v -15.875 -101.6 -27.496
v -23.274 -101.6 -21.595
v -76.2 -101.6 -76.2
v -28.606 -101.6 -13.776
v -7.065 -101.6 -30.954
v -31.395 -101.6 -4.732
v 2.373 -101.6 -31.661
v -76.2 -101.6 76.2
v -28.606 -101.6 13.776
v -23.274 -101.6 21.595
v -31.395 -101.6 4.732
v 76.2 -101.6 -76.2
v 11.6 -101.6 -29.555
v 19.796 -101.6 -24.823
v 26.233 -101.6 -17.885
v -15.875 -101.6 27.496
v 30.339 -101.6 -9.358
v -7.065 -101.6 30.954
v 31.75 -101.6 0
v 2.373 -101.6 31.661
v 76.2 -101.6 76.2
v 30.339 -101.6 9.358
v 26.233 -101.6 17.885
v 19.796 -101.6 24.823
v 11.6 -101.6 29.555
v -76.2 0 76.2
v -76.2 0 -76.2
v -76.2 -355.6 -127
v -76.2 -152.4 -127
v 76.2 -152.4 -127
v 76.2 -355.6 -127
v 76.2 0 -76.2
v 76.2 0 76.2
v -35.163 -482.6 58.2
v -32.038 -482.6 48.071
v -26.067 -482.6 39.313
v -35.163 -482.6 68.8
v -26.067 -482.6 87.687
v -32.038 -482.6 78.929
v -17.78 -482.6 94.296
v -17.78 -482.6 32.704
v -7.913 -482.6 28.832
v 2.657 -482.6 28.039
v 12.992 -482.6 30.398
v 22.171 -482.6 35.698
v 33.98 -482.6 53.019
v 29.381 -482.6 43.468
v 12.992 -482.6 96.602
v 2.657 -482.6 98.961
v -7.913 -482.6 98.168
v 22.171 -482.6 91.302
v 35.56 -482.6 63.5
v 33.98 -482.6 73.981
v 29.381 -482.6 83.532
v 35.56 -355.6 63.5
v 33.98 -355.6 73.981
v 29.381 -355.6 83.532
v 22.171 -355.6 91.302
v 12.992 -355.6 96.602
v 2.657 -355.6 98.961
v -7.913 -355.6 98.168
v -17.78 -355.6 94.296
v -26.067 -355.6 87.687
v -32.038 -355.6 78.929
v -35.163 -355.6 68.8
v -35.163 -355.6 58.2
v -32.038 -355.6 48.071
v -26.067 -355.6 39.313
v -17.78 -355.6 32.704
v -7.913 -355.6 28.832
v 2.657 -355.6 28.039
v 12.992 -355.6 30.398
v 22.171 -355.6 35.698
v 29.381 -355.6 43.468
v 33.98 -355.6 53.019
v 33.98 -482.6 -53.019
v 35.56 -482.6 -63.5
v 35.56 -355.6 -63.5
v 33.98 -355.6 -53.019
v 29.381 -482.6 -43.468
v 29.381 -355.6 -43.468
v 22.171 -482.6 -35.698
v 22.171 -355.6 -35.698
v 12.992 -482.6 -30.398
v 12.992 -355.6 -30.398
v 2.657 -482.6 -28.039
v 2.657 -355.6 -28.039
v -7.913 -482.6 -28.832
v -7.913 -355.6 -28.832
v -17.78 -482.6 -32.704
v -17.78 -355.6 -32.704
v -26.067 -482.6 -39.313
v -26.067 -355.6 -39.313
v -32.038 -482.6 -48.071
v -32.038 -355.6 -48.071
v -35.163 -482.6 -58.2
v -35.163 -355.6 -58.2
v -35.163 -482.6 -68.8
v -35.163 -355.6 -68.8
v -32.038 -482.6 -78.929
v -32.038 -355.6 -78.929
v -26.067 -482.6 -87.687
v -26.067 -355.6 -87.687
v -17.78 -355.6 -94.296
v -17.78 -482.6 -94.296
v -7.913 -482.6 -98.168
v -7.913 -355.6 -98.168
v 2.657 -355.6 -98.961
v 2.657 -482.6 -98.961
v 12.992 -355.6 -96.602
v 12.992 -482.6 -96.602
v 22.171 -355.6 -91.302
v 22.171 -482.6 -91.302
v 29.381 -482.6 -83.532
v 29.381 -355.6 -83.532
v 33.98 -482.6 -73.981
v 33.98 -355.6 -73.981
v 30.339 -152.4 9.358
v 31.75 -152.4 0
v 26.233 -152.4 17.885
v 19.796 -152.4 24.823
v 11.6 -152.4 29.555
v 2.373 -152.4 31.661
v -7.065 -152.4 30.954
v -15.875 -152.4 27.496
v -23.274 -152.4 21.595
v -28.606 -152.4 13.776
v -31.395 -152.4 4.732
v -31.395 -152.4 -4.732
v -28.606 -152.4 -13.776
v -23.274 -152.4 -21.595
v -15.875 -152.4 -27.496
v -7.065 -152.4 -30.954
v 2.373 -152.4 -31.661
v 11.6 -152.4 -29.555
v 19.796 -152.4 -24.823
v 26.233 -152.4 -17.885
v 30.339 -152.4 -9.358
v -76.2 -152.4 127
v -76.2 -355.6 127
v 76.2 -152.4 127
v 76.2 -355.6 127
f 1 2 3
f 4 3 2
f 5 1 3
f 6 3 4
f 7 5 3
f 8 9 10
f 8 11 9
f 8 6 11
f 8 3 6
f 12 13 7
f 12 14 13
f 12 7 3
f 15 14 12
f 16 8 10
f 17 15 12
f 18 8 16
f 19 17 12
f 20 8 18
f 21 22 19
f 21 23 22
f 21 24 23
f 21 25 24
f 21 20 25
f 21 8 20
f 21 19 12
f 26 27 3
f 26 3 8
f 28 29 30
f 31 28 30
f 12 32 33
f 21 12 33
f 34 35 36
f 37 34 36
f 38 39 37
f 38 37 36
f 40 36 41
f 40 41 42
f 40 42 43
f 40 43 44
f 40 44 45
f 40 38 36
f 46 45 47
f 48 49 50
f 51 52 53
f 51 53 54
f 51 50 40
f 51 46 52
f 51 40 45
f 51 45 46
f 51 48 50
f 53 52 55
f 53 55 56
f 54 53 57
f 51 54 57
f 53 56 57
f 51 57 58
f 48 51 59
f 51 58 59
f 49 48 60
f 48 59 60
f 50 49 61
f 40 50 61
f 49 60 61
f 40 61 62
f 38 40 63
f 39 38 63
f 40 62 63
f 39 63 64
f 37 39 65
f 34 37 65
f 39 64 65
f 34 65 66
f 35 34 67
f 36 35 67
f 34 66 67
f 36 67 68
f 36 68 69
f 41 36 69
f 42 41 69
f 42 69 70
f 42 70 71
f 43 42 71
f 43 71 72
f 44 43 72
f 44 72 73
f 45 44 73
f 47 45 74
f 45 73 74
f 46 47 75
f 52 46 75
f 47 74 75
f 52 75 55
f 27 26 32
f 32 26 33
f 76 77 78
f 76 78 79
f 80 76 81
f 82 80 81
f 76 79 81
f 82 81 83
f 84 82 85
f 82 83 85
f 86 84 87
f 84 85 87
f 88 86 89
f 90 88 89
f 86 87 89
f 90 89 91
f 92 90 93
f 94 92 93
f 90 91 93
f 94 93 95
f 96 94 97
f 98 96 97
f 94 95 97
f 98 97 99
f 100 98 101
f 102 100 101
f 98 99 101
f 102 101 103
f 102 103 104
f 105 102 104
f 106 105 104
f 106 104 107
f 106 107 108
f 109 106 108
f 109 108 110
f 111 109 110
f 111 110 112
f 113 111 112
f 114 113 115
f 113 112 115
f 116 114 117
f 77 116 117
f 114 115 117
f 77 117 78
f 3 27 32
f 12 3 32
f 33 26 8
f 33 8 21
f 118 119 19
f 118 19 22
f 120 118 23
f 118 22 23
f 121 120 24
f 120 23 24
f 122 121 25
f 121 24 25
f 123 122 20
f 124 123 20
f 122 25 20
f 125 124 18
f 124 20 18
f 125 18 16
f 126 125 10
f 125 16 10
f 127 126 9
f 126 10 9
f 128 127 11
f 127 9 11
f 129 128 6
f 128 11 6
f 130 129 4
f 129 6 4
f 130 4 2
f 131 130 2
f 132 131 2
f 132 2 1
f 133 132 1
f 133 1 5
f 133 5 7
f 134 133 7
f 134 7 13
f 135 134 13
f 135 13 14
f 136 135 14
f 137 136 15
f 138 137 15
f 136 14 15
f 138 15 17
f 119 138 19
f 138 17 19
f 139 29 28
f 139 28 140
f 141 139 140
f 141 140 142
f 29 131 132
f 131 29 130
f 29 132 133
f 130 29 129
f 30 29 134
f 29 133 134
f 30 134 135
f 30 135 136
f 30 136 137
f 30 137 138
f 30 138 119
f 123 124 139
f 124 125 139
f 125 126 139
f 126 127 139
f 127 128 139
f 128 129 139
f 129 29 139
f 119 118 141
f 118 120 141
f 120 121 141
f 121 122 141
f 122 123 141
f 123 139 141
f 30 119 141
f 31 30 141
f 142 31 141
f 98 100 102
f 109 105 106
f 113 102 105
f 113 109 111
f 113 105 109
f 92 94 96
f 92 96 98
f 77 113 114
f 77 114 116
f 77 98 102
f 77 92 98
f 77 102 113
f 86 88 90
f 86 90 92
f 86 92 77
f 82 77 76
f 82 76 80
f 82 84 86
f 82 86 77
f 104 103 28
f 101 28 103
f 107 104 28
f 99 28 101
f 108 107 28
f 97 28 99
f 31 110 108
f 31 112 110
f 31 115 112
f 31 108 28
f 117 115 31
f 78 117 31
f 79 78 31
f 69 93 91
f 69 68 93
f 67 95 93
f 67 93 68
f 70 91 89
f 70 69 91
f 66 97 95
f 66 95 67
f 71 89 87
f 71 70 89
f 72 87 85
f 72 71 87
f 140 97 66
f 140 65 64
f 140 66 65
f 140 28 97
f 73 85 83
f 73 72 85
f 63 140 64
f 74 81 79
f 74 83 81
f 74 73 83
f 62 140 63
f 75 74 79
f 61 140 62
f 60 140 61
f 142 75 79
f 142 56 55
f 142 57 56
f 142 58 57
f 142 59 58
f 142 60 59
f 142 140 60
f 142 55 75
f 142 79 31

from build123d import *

# Parameters (mm, degrees)
F0_W     = 152.4
F0_H     = 152.4
F1_DEPTH = 101.6
F2_R     = 31.75
F3_DEPTH = 50.8
F4_W     = 152.4
F4_H     = 254
F5_DEPTH = 203.2
F6_R     = 35.56
F7_DEPTH = 127


with BuildPart() as f1:
    # F0 (on Front) → F1 (new body)
    with BuildSketch(Plane.XZ):
        Rectangle(F0_W, F0_H)
    extrude(amount=F1_DEPTH)

    # F2 (on face) → F3 (join)
    with BuildSketch(Plane.XZ.offset(101.6)):
        Circle(F2_R)
    extrude(amount=F3_DEPTH)

    # F4 (on face) → F5 (join)
    with BuildSketch(Plane.XZ.offset(152.4)):
        Rectangle(F4_W, F4_H)
    extrude(amount=F5_DEPTH)

    # F6 (on face) → F7 (join)
    with BuildSketch(Plane.XZ.offset(355.6)):
        with Locations((0, -63.5)):
            Circle(F6_R)
        with Locations((0, 63.5)):
            Circle(F6_R)
    extrude(amount=F7_DEPTH)


solid = f1.part
